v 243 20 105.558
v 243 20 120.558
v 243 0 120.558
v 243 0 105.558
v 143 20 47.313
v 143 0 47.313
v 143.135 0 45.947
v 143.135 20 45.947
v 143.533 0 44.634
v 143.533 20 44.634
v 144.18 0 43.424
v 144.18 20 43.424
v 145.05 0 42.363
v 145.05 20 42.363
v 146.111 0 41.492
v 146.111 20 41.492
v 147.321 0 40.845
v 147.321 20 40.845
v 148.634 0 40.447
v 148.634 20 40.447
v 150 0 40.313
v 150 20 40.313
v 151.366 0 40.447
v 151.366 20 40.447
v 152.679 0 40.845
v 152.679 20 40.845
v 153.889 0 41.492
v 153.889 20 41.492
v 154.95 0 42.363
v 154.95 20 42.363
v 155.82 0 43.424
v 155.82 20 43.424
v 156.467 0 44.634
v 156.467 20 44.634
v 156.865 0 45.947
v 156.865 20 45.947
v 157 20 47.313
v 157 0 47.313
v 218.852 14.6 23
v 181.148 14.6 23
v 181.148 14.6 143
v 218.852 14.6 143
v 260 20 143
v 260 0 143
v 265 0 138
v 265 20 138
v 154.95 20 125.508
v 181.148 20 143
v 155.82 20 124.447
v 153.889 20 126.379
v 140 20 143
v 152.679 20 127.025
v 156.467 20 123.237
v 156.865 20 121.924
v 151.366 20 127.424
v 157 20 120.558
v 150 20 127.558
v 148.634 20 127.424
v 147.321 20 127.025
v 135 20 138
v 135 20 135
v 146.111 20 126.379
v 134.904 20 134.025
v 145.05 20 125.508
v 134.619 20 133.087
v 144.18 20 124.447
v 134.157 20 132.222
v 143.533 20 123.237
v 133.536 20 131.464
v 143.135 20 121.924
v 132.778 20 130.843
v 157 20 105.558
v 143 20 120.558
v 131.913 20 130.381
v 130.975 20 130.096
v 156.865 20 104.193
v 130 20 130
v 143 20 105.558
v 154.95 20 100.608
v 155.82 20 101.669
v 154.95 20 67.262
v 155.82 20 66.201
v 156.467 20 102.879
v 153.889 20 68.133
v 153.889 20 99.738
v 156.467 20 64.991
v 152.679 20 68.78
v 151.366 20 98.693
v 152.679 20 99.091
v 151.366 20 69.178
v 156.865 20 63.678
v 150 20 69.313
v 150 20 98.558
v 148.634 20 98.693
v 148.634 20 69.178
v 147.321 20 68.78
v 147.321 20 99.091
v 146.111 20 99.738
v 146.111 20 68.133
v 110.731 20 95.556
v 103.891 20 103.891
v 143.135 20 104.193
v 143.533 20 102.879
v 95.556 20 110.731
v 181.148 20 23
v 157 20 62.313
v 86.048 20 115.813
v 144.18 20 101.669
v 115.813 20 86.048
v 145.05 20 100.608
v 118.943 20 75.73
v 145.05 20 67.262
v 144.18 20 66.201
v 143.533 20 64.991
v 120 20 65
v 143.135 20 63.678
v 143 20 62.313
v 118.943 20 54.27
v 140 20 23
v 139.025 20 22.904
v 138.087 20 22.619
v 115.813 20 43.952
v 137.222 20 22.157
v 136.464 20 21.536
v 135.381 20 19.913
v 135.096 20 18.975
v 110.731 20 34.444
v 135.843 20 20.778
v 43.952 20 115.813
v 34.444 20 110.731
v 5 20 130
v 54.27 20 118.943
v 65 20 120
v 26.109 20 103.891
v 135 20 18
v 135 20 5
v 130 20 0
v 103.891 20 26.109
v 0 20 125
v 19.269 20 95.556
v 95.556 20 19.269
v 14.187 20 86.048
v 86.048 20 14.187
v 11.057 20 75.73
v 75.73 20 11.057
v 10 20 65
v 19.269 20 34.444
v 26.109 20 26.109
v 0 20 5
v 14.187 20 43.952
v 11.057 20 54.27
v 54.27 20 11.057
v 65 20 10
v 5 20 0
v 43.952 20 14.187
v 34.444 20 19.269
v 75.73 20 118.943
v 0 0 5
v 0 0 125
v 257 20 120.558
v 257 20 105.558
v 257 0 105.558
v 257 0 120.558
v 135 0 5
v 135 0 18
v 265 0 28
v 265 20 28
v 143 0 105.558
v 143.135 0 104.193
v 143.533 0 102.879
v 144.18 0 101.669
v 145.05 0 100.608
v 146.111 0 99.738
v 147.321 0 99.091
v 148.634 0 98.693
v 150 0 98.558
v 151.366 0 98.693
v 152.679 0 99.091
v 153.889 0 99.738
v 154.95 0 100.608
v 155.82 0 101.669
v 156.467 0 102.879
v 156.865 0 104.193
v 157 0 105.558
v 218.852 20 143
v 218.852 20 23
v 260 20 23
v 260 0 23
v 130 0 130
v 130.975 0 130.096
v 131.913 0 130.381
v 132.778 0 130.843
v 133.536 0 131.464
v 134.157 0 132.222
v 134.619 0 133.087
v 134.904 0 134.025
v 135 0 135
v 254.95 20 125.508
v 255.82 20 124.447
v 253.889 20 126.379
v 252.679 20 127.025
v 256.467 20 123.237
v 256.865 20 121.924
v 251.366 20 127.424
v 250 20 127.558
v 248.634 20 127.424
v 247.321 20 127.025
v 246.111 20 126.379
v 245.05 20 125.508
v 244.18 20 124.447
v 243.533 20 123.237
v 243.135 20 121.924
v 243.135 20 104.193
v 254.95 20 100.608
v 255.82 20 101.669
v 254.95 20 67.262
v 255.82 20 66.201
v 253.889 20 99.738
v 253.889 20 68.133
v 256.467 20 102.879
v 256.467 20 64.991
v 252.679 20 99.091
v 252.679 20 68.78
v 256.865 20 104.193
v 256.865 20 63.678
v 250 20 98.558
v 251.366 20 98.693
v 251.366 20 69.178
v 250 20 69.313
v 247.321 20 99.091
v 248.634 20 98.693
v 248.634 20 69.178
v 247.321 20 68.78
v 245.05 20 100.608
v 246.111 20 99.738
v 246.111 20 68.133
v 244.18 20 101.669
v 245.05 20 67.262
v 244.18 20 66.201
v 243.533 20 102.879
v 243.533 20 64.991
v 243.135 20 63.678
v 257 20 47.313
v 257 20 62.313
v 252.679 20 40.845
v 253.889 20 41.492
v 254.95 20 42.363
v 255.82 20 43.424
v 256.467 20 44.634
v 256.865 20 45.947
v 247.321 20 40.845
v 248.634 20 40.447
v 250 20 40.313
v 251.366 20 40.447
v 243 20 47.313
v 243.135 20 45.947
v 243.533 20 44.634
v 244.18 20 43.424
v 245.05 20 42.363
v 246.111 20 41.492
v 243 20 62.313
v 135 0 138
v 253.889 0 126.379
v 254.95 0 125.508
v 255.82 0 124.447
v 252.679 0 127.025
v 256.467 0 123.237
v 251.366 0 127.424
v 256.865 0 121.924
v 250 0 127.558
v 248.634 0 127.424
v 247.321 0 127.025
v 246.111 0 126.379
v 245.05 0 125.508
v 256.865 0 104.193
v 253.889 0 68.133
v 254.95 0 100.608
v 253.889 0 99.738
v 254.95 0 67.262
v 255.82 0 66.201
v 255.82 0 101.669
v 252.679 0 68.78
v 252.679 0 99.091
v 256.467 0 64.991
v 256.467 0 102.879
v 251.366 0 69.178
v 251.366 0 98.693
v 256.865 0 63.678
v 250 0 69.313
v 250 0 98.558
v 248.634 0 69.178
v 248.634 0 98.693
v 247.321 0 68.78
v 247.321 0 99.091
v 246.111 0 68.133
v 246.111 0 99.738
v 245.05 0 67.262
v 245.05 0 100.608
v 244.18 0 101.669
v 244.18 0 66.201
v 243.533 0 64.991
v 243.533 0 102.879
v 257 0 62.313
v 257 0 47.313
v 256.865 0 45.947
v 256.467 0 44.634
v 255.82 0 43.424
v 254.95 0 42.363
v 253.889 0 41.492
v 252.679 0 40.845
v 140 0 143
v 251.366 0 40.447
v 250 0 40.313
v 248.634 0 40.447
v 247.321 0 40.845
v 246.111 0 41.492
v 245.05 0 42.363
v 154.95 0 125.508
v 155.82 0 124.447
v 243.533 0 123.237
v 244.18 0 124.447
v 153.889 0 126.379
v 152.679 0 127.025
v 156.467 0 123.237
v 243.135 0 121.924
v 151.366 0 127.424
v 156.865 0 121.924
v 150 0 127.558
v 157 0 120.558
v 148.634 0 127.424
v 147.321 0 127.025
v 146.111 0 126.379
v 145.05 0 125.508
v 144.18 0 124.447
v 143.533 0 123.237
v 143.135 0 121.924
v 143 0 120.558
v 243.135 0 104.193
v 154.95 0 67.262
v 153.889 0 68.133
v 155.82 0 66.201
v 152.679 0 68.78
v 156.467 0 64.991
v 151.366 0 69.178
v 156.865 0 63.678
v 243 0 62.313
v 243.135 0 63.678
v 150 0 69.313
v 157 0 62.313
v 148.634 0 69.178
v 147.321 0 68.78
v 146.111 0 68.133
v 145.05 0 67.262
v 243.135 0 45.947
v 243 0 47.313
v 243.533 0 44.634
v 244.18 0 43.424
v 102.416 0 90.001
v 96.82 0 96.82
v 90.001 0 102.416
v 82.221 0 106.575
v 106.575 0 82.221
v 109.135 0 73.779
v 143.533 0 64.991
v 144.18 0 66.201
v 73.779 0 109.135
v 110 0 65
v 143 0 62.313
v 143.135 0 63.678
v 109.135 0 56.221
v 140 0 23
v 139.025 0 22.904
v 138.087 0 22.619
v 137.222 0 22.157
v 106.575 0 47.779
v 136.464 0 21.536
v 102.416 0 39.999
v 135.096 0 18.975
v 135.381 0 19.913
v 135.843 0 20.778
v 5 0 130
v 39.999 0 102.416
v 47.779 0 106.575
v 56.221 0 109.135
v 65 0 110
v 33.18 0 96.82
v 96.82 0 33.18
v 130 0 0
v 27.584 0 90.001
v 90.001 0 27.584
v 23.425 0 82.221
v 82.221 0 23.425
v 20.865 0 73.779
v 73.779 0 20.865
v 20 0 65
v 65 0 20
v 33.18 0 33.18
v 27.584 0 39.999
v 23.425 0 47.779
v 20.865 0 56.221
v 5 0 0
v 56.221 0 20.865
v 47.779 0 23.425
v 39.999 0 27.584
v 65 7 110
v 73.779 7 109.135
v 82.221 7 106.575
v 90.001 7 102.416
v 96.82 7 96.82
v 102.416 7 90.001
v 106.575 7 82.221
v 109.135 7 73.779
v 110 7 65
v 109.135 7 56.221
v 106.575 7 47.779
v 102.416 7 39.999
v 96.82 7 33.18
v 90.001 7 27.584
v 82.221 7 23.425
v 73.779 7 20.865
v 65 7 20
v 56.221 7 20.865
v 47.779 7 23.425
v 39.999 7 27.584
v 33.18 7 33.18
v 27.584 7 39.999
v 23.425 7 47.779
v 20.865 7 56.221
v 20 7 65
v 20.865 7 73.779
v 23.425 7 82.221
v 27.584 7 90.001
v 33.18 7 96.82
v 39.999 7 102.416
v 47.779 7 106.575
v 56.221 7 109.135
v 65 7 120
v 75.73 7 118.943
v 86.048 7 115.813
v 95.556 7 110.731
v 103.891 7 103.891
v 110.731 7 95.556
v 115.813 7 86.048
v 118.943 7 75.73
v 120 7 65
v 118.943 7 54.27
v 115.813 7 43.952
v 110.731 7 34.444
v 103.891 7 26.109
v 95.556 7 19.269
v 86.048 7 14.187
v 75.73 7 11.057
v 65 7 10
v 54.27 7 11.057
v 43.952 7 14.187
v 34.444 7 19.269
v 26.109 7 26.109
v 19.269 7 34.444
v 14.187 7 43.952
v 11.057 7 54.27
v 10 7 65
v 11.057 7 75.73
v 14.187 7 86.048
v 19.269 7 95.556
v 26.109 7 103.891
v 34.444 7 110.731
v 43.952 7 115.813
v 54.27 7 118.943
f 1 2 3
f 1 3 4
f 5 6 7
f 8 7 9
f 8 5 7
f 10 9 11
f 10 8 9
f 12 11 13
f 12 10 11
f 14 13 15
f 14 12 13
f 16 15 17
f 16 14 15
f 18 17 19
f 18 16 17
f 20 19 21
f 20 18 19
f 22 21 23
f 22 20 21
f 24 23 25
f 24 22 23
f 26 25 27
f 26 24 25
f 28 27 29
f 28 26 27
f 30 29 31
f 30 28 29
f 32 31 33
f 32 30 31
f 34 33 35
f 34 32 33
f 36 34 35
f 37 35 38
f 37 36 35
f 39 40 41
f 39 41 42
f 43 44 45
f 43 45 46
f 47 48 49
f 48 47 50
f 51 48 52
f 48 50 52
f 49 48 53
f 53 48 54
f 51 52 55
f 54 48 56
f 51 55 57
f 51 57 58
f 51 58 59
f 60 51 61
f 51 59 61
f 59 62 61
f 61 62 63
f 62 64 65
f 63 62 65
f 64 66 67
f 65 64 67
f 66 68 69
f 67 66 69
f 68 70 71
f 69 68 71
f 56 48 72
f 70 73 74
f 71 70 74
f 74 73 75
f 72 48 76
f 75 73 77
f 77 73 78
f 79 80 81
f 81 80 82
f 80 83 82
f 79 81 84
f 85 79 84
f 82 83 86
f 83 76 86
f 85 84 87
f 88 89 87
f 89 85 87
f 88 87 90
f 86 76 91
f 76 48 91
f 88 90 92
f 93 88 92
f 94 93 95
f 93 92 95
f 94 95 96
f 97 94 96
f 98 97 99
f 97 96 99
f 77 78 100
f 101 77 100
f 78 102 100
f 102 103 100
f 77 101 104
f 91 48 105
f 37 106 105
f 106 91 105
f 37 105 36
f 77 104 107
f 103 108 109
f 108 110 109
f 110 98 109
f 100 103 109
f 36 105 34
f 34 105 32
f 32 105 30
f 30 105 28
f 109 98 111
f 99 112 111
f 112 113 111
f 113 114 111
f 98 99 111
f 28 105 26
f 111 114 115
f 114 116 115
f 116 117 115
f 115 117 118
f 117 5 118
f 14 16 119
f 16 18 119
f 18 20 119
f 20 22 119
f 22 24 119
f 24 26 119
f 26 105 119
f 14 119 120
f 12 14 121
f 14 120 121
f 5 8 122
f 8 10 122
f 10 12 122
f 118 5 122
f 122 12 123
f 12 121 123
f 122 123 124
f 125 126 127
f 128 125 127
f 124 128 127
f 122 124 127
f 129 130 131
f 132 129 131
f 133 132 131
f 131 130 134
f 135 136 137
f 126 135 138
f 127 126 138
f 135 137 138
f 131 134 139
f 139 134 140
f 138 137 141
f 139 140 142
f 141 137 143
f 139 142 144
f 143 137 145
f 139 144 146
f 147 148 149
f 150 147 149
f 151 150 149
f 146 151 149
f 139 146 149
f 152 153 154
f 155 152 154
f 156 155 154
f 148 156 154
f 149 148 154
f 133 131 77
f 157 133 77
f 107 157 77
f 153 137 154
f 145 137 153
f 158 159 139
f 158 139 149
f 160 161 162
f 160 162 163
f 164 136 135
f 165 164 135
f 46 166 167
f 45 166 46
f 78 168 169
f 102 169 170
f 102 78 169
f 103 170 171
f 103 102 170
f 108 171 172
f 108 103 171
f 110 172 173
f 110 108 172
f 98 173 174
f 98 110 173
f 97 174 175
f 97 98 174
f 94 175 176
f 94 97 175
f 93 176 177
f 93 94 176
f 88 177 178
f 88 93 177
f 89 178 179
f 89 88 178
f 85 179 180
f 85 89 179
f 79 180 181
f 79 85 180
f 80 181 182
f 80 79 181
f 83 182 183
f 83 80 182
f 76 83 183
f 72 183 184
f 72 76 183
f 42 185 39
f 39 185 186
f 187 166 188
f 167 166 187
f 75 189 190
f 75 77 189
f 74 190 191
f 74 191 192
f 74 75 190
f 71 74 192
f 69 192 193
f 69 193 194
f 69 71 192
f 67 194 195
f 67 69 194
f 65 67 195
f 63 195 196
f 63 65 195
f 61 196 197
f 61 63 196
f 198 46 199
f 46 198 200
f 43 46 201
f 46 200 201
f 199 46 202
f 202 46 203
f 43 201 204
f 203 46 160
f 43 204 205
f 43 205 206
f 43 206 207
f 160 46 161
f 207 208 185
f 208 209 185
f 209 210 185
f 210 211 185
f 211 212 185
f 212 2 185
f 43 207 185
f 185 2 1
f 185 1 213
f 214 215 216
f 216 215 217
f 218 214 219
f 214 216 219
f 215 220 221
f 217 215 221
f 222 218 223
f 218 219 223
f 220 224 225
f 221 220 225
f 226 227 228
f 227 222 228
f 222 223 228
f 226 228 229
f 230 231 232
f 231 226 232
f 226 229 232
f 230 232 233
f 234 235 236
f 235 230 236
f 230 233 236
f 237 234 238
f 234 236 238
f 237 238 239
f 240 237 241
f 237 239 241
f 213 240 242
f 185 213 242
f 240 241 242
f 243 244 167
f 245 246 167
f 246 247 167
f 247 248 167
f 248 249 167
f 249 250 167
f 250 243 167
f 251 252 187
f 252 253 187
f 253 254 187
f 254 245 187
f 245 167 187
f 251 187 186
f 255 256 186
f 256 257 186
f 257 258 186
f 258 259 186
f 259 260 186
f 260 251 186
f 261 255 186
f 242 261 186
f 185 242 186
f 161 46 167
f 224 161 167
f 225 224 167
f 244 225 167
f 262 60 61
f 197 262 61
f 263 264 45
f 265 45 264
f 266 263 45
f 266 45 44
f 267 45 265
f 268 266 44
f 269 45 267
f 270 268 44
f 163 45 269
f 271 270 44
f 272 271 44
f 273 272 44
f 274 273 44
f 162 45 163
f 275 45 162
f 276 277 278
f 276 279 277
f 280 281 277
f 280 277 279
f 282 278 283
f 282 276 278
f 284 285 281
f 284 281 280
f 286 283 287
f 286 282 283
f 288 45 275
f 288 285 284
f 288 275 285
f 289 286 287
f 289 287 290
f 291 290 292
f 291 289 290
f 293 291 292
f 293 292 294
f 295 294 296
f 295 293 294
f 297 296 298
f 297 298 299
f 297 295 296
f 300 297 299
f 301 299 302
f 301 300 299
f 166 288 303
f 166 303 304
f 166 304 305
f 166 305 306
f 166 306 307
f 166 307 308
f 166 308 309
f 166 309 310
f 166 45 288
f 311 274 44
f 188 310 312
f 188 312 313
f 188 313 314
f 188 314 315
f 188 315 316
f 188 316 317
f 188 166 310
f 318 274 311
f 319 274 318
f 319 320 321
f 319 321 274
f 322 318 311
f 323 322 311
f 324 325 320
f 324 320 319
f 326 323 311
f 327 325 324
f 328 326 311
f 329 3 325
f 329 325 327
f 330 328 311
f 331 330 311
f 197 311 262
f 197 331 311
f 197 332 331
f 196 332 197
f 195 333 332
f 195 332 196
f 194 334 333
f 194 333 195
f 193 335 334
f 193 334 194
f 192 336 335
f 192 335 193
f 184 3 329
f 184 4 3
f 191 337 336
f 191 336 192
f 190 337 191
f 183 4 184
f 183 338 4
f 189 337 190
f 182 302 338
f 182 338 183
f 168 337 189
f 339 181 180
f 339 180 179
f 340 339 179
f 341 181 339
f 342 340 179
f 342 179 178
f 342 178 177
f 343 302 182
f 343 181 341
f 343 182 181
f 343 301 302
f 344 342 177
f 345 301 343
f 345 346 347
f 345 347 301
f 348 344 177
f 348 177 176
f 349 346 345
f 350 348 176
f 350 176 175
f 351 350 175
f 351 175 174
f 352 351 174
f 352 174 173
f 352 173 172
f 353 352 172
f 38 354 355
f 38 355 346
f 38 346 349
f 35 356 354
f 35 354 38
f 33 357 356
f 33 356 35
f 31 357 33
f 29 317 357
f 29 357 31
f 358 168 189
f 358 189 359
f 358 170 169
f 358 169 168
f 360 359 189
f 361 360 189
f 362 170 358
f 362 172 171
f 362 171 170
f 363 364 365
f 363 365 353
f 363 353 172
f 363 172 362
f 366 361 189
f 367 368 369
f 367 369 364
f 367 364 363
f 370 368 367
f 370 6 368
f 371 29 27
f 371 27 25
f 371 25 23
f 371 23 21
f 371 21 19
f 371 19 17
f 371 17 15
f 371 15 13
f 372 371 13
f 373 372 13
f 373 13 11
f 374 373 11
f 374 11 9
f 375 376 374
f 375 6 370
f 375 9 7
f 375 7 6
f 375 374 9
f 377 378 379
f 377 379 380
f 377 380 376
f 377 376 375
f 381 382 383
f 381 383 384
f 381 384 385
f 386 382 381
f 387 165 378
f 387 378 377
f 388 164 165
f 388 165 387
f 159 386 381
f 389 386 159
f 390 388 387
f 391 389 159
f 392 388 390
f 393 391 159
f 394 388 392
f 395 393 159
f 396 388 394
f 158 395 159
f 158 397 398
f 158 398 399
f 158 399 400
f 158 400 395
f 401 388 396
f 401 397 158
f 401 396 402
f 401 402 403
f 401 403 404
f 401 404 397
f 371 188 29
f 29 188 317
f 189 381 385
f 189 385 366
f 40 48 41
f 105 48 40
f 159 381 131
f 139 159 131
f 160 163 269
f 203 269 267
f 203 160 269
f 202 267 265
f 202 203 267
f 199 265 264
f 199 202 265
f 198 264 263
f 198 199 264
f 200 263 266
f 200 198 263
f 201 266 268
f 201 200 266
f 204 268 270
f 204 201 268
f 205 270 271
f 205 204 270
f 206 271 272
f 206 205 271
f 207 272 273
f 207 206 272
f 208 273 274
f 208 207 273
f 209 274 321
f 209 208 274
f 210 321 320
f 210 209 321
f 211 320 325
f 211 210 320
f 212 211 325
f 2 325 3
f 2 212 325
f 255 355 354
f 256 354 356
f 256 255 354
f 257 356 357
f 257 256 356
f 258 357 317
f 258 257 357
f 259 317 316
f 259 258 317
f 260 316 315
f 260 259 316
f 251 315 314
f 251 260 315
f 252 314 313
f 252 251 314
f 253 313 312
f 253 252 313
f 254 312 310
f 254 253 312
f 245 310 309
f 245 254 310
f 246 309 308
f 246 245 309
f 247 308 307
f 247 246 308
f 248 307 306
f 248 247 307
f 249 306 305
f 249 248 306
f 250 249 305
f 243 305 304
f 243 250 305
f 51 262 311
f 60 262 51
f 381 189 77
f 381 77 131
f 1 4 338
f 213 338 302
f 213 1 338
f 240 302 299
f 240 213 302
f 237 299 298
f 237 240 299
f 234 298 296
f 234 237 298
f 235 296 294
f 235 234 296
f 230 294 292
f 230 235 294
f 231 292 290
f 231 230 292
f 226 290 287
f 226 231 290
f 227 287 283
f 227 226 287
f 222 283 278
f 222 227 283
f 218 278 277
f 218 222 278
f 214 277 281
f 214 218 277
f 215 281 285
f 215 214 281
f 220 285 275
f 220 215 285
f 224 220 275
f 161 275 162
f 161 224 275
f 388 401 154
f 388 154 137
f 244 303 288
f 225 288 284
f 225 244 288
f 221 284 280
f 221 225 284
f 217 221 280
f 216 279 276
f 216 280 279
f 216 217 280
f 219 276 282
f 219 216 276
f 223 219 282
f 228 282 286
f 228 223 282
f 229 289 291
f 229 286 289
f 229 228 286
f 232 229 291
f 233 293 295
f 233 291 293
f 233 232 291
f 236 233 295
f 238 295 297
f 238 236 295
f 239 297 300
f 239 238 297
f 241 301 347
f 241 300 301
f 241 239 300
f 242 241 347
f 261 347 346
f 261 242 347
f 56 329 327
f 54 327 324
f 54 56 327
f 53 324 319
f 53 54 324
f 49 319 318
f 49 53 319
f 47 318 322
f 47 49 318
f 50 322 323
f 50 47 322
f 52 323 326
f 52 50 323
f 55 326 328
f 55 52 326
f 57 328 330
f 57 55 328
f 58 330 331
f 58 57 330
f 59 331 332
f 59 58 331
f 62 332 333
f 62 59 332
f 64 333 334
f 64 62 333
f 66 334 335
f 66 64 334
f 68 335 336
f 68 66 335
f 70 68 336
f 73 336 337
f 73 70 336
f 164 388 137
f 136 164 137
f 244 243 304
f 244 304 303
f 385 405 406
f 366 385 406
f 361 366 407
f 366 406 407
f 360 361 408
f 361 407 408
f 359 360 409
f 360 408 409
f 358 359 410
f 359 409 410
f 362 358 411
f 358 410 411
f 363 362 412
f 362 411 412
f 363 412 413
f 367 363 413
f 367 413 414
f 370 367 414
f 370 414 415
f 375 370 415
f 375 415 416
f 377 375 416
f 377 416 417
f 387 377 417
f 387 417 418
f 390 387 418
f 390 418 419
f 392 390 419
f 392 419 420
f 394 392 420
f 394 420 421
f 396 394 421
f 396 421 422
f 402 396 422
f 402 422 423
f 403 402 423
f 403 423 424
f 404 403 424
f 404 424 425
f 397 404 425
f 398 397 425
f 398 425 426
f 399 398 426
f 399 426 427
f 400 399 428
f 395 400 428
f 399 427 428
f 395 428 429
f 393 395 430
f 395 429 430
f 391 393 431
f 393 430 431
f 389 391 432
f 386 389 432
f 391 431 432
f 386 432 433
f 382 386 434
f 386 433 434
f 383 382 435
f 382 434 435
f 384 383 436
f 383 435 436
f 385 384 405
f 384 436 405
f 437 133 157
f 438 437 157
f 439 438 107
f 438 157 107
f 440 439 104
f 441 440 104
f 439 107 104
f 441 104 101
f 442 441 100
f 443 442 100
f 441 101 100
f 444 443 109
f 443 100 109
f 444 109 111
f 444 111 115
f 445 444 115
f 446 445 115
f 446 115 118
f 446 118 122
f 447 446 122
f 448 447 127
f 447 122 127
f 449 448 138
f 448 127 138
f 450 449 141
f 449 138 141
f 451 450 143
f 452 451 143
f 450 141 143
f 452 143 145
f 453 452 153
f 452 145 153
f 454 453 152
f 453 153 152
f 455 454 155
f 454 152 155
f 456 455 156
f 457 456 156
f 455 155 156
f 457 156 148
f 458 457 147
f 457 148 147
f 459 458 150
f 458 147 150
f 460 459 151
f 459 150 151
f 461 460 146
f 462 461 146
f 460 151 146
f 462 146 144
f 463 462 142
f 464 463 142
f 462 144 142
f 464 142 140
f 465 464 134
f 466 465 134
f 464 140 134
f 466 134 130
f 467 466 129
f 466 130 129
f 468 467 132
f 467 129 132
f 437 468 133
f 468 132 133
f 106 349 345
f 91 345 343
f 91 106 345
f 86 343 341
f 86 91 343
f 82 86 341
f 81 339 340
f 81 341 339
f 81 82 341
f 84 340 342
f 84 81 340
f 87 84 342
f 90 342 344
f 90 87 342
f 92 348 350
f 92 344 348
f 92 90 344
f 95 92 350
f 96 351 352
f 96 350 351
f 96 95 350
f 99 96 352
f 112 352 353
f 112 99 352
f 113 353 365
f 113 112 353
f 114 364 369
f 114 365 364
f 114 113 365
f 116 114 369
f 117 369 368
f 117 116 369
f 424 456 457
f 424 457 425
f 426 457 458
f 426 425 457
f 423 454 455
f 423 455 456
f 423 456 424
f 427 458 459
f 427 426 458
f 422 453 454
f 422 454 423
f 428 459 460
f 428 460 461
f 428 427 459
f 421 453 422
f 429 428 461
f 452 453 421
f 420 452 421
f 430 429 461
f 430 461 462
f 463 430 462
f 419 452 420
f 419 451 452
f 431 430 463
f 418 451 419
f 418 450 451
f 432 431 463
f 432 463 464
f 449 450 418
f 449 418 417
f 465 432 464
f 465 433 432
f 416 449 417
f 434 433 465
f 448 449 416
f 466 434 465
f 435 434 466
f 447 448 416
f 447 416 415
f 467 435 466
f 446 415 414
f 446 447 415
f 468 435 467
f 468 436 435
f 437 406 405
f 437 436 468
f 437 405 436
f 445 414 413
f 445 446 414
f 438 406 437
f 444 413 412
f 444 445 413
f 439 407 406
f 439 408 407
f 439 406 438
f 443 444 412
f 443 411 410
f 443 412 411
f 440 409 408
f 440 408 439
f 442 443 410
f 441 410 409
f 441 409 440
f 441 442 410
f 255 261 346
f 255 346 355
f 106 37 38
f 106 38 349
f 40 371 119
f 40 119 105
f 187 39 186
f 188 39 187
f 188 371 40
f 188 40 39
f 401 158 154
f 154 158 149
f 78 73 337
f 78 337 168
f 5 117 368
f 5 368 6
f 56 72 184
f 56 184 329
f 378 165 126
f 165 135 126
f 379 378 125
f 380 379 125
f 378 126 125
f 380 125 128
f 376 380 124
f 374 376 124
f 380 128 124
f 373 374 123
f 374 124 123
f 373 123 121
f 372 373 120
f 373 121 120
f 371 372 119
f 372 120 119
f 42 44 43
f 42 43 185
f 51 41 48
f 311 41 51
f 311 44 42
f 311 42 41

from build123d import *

# Parameters (mm, degrees)
EXTRUDE_1_DEPTH     = 20
SKETCH_3_R          = 45
CUT_EXTRUDE_1_DEPTH = 302.784691461
SKETCH_4_R          = 55
CUT_EXTRUDE_2_DEPTH = 13
SKETCH_5_W          = 37.703420814
SKETCH_5_H          = 120
CUT_EXTRUDE_3_DEPTH = 5.4
CUT_EXTRUDE_4_DEPTH = 302.784691461
FILLET_1_R          = 5
CHAMFER_1_SIZE      = 5


with BuildPart() as part:
    # 草图2 → 凸台-拉伸1 (new body)
    with BuildSketch(Plane(origin=(0, 0, 0), x_dir=(1, 0, 0), z_dir=(0, 1, 0))):
        Polygon((0, 0), (135, 0), (135, -23), (265, -23), (265, -143), (135, -143), (135, -130), (0, -130), align=None)
    extrude(amount=EXTRUDE_1_DEPTH)

    # 草图3 → 切除-拉伸1 (cut, through all)
    with BuildSketch(Plane(origin=(0, 20, 0), x_dir=(1, 0, 0), z_dir=(0, 1, 0))):
        with Locations(Location((65, -65, 0), (0, 0, 270))):
            Circle(SKETCH_3_R)
    extrude(amount=-CUT_EXTRUDE_1_DEPTH, mode=Mode.SUBTRACT)

    # 草图4 → 切除-拉伸2 (cut)
    with BuildSketch(Plane(origin=(0, 20, 0), x_dir=(1, 0, 0), z_dir=(0, 1, 0))):
        with Locations(Location((65, -65, 0), (0, 0, 270))):
            Circle(SKETCH_4_R)
    extrude(amount=-CUT_EXTRUDE_2_DEPTH, mode=Mode.SUBTRACT)

    # 草图5 → 切除-拉伸3 (cut)
    with BuildSketch(Plane(origin=(0, 20, 0), x_dir=(1, 0, 0), z_dir=(0, 1, 0))):
        with Locations((200, -83)):
            Rectangle(SKETCH_5_W, SKETCH_5_H)
    extrude(amount=-CUT_EXTRUDE_3_DEPTH, mode=Mode.SUBTRACT)

    # 草图6 → 切除-拉伸4 (cut, through all)
    with BuildSketch(Plane(origin=(0, 20, 0), x_dir=(1, 0, 0), z_dir=(0, 1, 0))):
        with BuildLine():
            Line((157, -47.312507702), (157, -62.312507702))
            ThreePointArc((157, -62.312507702), (150, -69.312507702), (143, -62.312507702))
            Line((143, -62.312507702), (143, -47.312507702))
            ThreePointArc((143, -47.312507702), (150, -40.312507702), (157, -47.312507702))
        make_face()
        with BuildLine():
            Line((157, -105.55824709), (157, -120.55824709))
            ThreePointArc((157, -120.55824709), (150, -127.55824709), (143, -120.55824709))
            Line((143, -120.55824709), (143, -105.55824709))
            ThreePointArc((143, -105.55824709), (150, -98.55824709), (157, -105.55824709))
        make_face()
        with BuildLine():
            Line((257, -47.312507702), (257, -62.312507702))
            ThreePointArc((257, -62.312507702), (250, -69.312507702), (243, -62.312507702))
            Line((243, -62.312507702), (243, -47.312507702))
            ThreePointArc((243, -47.312507702), (250, -40.312507702), (257, -47.312507702))
        make_face()
        with BuildLine():
            Line((257, -105.55824709), (257, -120.55824709))
            ThreePointArc((257, -120.55824709), (250, -127.55824709), (243, -120.55824709))
            Line((243, -120.55824709), (243, -105.55824709))
            ThreePointArc((243, -105.55824709), (250, -98.55824709), (257, -105.55824709))
        make_face()
    extrude(amount=-CUT_EXTRUDE_4_DEPTH, mode=Mode.SUBTRACT)

    # 圆角1
    fillet_1_edges = [part.edges().sort_by_distance(p)[0] for p in [
        (135, 10, 23),
        (135, 10, 130),
    ]]
    fillet(fillet_1_edges, radius=FILLET_1_R)

    # 倒角1
    chamfer_1_edges = [part.edges().sort_by_distance(p)[0] for p in [
        (0, 10, 0),
        (135, 10, 0),
        (265, 10, 23),
        (265, 10, 143),
        (135, 10, 143),
        (0, 10, 130),
    ]]
    chamfer(chamfer_1_edges, length=CHAMFER_1_SIZE)


solid = part.part
